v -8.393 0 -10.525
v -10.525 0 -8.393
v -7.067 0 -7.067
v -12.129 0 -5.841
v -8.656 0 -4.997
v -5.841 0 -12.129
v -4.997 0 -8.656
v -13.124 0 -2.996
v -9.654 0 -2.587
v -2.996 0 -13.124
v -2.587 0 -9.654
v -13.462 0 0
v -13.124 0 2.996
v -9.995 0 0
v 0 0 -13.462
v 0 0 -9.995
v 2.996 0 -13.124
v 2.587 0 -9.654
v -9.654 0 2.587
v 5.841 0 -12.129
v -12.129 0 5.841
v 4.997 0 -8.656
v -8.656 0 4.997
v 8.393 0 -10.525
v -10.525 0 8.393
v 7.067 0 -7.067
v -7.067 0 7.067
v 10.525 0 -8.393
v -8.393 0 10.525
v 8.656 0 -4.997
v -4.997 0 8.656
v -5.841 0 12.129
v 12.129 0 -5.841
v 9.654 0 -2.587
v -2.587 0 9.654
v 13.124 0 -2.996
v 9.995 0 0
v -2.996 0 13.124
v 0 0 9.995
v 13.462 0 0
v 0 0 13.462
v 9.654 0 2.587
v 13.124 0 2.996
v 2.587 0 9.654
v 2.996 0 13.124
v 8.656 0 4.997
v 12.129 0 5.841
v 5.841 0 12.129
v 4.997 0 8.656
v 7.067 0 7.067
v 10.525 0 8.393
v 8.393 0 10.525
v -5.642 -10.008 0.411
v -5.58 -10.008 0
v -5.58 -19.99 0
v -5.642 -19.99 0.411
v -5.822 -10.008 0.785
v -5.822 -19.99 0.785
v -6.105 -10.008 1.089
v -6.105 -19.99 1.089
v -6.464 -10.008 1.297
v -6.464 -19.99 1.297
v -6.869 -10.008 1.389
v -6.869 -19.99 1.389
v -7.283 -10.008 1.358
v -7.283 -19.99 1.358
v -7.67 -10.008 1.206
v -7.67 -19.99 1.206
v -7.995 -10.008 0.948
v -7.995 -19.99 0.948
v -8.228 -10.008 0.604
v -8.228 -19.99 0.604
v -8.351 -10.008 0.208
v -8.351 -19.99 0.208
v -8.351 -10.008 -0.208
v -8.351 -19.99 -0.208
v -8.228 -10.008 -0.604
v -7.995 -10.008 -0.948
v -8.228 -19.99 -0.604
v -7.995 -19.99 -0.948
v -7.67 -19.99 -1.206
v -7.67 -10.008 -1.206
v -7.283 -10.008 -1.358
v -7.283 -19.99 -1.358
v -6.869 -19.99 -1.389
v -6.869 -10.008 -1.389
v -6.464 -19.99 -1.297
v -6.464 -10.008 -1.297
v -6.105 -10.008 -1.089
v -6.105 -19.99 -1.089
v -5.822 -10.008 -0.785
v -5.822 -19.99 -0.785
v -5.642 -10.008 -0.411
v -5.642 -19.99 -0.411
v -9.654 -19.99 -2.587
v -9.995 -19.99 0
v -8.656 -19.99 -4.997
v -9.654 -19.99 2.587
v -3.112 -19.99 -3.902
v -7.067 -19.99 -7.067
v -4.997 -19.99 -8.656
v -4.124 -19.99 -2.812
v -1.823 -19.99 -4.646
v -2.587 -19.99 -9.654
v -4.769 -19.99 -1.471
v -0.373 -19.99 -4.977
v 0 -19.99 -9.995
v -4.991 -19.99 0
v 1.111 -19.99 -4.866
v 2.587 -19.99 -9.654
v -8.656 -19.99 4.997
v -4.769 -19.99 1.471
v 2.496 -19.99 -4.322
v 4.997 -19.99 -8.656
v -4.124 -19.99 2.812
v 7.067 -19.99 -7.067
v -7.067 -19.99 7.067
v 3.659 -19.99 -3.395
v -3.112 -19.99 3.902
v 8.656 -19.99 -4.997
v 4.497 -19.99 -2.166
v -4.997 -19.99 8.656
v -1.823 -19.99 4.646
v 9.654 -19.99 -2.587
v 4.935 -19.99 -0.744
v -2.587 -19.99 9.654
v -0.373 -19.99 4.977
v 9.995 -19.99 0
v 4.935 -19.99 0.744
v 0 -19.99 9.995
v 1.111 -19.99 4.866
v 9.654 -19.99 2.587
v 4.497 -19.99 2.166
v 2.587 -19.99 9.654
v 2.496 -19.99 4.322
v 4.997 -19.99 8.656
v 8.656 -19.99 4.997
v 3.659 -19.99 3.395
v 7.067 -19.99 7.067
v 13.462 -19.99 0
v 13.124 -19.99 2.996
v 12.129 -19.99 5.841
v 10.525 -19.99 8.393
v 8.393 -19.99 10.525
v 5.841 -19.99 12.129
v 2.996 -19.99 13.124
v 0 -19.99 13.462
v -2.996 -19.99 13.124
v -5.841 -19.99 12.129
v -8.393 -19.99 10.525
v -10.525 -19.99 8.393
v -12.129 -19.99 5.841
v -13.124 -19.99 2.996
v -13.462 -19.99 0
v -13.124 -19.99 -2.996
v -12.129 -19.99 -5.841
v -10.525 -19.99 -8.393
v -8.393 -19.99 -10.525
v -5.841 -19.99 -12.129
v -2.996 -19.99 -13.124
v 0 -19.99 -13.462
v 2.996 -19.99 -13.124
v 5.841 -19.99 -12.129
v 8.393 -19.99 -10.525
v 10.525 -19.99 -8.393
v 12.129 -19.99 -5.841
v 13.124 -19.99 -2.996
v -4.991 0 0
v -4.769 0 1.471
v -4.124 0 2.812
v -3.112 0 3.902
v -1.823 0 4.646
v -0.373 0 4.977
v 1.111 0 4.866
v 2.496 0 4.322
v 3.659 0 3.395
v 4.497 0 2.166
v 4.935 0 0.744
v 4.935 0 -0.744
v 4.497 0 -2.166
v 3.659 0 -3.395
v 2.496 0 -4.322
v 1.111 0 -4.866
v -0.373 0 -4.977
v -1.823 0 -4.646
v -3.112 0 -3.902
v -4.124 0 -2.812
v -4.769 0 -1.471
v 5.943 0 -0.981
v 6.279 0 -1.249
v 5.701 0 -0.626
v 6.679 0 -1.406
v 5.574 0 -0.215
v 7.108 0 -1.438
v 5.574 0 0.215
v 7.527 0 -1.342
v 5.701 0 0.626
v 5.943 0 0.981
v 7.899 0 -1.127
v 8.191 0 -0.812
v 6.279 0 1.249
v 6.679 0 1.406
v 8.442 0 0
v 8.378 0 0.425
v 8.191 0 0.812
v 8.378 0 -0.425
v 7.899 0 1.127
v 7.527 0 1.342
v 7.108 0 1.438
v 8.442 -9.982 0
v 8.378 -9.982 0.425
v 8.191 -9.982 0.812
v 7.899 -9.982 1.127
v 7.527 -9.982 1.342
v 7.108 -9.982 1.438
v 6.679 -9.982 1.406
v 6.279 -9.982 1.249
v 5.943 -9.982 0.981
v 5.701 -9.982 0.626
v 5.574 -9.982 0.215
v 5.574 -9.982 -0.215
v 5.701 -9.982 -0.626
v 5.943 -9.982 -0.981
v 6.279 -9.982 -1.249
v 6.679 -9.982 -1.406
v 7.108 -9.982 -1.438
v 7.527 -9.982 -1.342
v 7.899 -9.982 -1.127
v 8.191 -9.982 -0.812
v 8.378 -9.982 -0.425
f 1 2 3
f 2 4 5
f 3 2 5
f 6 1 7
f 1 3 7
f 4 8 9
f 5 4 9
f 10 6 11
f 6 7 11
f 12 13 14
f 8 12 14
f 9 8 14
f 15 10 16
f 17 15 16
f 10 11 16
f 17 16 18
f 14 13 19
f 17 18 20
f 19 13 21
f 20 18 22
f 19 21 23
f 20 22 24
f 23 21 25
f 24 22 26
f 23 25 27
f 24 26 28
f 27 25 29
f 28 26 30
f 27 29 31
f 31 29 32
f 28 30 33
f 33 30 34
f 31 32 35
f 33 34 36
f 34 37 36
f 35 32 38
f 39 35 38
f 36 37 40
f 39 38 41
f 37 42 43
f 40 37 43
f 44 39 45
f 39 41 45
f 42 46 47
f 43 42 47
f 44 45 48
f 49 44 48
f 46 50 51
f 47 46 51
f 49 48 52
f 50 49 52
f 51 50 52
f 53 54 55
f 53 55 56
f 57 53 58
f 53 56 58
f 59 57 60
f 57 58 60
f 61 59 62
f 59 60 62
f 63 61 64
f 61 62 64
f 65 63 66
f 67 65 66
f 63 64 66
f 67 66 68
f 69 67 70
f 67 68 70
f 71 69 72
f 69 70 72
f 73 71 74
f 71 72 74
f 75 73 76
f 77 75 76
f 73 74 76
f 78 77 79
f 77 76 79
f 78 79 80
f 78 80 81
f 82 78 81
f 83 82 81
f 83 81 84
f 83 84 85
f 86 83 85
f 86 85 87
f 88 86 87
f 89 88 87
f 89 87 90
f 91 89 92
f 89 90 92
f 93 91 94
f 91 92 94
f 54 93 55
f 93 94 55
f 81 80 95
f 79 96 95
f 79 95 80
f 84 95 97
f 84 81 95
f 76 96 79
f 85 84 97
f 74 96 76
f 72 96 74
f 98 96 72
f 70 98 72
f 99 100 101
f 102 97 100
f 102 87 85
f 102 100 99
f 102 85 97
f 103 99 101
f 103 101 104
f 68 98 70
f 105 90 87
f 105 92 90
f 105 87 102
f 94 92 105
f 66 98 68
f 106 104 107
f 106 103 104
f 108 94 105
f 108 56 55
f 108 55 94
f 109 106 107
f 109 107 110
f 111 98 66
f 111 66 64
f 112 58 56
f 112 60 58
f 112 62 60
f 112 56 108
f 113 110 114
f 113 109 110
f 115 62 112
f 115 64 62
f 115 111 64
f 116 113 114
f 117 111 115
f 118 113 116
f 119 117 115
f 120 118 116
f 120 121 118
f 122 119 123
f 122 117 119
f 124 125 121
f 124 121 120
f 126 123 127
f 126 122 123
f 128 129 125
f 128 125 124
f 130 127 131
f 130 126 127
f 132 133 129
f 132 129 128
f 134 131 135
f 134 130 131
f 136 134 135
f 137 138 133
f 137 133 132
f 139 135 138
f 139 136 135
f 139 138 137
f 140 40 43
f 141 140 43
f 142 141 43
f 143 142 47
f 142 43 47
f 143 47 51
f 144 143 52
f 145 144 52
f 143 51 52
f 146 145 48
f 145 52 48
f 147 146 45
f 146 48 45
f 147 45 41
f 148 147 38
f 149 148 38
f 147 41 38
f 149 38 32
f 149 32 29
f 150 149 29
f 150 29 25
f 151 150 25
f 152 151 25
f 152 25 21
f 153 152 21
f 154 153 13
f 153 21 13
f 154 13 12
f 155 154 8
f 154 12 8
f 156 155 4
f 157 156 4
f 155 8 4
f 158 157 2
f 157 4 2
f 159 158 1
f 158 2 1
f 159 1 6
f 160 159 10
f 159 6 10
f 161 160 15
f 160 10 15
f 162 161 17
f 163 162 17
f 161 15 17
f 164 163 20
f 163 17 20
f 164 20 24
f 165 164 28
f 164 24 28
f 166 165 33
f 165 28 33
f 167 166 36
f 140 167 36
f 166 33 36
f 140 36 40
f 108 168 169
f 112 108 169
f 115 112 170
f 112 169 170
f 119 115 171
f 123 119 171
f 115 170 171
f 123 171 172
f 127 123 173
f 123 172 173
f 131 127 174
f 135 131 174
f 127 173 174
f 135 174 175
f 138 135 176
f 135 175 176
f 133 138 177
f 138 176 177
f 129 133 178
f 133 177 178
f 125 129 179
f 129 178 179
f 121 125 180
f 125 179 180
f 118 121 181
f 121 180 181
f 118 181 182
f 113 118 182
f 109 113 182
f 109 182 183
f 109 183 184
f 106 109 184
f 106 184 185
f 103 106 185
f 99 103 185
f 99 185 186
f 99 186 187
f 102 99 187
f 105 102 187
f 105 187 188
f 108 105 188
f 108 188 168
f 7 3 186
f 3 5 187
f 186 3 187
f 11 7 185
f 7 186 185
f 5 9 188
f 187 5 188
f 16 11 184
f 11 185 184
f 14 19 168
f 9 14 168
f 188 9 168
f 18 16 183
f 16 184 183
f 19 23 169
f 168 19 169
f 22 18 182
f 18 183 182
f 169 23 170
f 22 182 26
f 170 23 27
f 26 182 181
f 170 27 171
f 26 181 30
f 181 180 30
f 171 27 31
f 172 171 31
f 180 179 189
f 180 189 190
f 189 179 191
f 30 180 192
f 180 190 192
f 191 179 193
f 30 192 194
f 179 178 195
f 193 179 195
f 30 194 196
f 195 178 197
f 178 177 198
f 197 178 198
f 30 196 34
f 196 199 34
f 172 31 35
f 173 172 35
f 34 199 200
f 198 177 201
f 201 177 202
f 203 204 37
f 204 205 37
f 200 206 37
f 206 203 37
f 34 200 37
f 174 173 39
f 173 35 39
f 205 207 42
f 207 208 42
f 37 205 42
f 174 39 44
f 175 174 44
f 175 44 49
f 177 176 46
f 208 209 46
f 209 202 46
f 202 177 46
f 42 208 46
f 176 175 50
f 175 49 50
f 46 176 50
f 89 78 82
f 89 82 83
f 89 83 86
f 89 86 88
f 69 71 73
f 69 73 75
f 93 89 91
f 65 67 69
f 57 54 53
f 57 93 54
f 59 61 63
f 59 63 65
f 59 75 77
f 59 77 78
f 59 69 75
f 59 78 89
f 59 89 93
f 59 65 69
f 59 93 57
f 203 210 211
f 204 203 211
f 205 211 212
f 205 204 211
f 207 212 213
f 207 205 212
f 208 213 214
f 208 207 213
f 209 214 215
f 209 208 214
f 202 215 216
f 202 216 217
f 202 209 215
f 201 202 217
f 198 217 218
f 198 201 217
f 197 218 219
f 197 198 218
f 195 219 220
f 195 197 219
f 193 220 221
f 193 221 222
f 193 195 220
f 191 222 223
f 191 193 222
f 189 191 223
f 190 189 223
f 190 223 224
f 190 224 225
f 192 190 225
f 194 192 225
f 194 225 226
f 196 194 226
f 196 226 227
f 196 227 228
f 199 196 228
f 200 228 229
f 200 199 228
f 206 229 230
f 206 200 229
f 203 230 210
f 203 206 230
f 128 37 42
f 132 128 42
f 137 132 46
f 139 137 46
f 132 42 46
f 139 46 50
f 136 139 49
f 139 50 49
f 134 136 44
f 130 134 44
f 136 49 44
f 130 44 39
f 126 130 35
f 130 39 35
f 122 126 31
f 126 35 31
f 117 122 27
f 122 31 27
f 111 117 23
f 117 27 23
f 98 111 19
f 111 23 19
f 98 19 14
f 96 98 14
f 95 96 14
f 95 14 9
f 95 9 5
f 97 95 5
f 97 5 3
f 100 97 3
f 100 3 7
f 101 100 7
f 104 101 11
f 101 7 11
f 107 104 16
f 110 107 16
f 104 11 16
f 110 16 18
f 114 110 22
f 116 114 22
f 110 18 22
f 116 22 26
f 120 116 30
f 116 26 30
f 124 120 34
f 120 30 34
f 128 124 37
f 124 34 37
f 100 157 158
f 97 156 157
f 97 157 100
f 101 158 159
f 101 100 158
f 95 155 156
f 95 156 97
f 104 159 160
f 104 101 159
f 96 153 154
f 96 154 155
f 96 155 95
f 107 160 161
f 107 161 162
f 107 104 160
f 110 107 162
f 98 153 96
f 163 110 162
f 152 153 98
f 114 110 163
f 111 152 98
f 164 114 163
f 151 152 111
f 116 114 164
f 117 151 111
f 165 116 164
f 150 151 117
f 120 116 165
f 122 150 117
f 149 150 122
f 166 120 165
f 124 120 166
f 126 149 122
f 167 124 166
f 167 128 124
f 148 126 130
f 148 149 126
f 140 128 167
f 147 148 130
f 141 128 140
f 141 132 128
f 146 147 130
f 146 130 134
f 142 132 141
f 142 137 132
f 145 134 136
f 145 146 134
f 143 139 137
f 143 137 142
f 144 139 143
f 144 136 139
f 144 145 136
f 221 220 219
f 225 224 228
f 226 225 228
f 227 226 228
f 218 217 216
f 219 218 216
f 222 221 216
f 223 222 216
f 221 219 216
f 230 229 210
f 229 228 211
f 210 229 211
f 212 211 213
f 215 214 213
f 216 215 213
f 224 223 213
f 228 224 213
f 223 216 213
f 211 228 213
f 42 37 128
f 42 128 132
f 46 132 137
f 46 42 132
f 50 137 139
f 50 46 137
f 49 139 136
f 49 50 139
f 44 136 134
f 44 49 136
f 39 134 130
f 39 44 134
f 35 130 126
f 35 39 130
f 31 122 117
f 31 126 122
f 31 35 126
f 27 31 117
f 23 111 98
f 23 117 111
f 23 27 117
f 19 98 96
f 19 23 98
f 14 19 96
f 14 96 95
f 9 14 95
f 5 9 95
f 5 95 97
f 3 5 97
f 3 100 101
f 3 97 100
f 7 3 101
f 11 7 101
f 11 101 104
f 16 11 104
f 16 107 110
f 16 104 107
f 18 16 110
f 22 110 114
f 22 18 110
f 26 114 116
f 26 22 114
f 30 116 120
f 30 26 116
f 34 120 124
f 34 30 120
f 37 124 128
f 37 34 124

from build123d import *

# Parameters (mm, degrees)
F0_R      = 13.462
F1_DEPTH  = 19.9898
F2_R      = 9.9949
F3_DEPTH  = 25.4
F4_R      = 9.9949
F5_DEPTH  = 19.9898
F7_D      = 9.9822
F10_R     = 1.393139
F11_DEPTH = 9.9822
F12_R     = 1.441829
F13_DEPTH = 9.9822


with BuildPart() as f1:
    # F0 (on Front) → F1 (new body)
    with BuildSketch(Plane.XZ):
        Circle(F0_R)
    extrude(amount=F1_DEPTH)

    # F2 (on Front) → F3 (cut)
    with BuildSketch(Plane.XZ):
        Circle(F2_R)
    extrude(amount=F3_DEPTH, mode=Mode.SUBTRACT)


with BuildPart() as f5:
    # F4 (on Front) → F5 (new body)
    with BuildSketch(Plane.XZ):
        Circle(F4_R)
    extrude(amount=F5_DEPTH)

    # F7 (through all)
    with Locations(Plane.XZ.offset(19.9898)):
        with Locations((0, 0)):
            Hole(F7_D / 2)

    # F10 (on face) → F11 (cut)
    with BuildSketch(Plane.XZ.offset(19.9898)):
        with Locations((-6.973272, 0)):
            Circle(F10_R)
    extrude(amount=-F11_DEPTH, mode=Mode.SUBTRACT)

    # F12 (on face) → F13 (cut)
    with BuildSketch(Plane.XZ):
        with Locations((6.999859, 0)):
            Circle(F12_R)
    extrude(amount=F13_DEPTH, mode=Mode.SUBTRACT)


solid = Compound([f1.part, f5.part])
